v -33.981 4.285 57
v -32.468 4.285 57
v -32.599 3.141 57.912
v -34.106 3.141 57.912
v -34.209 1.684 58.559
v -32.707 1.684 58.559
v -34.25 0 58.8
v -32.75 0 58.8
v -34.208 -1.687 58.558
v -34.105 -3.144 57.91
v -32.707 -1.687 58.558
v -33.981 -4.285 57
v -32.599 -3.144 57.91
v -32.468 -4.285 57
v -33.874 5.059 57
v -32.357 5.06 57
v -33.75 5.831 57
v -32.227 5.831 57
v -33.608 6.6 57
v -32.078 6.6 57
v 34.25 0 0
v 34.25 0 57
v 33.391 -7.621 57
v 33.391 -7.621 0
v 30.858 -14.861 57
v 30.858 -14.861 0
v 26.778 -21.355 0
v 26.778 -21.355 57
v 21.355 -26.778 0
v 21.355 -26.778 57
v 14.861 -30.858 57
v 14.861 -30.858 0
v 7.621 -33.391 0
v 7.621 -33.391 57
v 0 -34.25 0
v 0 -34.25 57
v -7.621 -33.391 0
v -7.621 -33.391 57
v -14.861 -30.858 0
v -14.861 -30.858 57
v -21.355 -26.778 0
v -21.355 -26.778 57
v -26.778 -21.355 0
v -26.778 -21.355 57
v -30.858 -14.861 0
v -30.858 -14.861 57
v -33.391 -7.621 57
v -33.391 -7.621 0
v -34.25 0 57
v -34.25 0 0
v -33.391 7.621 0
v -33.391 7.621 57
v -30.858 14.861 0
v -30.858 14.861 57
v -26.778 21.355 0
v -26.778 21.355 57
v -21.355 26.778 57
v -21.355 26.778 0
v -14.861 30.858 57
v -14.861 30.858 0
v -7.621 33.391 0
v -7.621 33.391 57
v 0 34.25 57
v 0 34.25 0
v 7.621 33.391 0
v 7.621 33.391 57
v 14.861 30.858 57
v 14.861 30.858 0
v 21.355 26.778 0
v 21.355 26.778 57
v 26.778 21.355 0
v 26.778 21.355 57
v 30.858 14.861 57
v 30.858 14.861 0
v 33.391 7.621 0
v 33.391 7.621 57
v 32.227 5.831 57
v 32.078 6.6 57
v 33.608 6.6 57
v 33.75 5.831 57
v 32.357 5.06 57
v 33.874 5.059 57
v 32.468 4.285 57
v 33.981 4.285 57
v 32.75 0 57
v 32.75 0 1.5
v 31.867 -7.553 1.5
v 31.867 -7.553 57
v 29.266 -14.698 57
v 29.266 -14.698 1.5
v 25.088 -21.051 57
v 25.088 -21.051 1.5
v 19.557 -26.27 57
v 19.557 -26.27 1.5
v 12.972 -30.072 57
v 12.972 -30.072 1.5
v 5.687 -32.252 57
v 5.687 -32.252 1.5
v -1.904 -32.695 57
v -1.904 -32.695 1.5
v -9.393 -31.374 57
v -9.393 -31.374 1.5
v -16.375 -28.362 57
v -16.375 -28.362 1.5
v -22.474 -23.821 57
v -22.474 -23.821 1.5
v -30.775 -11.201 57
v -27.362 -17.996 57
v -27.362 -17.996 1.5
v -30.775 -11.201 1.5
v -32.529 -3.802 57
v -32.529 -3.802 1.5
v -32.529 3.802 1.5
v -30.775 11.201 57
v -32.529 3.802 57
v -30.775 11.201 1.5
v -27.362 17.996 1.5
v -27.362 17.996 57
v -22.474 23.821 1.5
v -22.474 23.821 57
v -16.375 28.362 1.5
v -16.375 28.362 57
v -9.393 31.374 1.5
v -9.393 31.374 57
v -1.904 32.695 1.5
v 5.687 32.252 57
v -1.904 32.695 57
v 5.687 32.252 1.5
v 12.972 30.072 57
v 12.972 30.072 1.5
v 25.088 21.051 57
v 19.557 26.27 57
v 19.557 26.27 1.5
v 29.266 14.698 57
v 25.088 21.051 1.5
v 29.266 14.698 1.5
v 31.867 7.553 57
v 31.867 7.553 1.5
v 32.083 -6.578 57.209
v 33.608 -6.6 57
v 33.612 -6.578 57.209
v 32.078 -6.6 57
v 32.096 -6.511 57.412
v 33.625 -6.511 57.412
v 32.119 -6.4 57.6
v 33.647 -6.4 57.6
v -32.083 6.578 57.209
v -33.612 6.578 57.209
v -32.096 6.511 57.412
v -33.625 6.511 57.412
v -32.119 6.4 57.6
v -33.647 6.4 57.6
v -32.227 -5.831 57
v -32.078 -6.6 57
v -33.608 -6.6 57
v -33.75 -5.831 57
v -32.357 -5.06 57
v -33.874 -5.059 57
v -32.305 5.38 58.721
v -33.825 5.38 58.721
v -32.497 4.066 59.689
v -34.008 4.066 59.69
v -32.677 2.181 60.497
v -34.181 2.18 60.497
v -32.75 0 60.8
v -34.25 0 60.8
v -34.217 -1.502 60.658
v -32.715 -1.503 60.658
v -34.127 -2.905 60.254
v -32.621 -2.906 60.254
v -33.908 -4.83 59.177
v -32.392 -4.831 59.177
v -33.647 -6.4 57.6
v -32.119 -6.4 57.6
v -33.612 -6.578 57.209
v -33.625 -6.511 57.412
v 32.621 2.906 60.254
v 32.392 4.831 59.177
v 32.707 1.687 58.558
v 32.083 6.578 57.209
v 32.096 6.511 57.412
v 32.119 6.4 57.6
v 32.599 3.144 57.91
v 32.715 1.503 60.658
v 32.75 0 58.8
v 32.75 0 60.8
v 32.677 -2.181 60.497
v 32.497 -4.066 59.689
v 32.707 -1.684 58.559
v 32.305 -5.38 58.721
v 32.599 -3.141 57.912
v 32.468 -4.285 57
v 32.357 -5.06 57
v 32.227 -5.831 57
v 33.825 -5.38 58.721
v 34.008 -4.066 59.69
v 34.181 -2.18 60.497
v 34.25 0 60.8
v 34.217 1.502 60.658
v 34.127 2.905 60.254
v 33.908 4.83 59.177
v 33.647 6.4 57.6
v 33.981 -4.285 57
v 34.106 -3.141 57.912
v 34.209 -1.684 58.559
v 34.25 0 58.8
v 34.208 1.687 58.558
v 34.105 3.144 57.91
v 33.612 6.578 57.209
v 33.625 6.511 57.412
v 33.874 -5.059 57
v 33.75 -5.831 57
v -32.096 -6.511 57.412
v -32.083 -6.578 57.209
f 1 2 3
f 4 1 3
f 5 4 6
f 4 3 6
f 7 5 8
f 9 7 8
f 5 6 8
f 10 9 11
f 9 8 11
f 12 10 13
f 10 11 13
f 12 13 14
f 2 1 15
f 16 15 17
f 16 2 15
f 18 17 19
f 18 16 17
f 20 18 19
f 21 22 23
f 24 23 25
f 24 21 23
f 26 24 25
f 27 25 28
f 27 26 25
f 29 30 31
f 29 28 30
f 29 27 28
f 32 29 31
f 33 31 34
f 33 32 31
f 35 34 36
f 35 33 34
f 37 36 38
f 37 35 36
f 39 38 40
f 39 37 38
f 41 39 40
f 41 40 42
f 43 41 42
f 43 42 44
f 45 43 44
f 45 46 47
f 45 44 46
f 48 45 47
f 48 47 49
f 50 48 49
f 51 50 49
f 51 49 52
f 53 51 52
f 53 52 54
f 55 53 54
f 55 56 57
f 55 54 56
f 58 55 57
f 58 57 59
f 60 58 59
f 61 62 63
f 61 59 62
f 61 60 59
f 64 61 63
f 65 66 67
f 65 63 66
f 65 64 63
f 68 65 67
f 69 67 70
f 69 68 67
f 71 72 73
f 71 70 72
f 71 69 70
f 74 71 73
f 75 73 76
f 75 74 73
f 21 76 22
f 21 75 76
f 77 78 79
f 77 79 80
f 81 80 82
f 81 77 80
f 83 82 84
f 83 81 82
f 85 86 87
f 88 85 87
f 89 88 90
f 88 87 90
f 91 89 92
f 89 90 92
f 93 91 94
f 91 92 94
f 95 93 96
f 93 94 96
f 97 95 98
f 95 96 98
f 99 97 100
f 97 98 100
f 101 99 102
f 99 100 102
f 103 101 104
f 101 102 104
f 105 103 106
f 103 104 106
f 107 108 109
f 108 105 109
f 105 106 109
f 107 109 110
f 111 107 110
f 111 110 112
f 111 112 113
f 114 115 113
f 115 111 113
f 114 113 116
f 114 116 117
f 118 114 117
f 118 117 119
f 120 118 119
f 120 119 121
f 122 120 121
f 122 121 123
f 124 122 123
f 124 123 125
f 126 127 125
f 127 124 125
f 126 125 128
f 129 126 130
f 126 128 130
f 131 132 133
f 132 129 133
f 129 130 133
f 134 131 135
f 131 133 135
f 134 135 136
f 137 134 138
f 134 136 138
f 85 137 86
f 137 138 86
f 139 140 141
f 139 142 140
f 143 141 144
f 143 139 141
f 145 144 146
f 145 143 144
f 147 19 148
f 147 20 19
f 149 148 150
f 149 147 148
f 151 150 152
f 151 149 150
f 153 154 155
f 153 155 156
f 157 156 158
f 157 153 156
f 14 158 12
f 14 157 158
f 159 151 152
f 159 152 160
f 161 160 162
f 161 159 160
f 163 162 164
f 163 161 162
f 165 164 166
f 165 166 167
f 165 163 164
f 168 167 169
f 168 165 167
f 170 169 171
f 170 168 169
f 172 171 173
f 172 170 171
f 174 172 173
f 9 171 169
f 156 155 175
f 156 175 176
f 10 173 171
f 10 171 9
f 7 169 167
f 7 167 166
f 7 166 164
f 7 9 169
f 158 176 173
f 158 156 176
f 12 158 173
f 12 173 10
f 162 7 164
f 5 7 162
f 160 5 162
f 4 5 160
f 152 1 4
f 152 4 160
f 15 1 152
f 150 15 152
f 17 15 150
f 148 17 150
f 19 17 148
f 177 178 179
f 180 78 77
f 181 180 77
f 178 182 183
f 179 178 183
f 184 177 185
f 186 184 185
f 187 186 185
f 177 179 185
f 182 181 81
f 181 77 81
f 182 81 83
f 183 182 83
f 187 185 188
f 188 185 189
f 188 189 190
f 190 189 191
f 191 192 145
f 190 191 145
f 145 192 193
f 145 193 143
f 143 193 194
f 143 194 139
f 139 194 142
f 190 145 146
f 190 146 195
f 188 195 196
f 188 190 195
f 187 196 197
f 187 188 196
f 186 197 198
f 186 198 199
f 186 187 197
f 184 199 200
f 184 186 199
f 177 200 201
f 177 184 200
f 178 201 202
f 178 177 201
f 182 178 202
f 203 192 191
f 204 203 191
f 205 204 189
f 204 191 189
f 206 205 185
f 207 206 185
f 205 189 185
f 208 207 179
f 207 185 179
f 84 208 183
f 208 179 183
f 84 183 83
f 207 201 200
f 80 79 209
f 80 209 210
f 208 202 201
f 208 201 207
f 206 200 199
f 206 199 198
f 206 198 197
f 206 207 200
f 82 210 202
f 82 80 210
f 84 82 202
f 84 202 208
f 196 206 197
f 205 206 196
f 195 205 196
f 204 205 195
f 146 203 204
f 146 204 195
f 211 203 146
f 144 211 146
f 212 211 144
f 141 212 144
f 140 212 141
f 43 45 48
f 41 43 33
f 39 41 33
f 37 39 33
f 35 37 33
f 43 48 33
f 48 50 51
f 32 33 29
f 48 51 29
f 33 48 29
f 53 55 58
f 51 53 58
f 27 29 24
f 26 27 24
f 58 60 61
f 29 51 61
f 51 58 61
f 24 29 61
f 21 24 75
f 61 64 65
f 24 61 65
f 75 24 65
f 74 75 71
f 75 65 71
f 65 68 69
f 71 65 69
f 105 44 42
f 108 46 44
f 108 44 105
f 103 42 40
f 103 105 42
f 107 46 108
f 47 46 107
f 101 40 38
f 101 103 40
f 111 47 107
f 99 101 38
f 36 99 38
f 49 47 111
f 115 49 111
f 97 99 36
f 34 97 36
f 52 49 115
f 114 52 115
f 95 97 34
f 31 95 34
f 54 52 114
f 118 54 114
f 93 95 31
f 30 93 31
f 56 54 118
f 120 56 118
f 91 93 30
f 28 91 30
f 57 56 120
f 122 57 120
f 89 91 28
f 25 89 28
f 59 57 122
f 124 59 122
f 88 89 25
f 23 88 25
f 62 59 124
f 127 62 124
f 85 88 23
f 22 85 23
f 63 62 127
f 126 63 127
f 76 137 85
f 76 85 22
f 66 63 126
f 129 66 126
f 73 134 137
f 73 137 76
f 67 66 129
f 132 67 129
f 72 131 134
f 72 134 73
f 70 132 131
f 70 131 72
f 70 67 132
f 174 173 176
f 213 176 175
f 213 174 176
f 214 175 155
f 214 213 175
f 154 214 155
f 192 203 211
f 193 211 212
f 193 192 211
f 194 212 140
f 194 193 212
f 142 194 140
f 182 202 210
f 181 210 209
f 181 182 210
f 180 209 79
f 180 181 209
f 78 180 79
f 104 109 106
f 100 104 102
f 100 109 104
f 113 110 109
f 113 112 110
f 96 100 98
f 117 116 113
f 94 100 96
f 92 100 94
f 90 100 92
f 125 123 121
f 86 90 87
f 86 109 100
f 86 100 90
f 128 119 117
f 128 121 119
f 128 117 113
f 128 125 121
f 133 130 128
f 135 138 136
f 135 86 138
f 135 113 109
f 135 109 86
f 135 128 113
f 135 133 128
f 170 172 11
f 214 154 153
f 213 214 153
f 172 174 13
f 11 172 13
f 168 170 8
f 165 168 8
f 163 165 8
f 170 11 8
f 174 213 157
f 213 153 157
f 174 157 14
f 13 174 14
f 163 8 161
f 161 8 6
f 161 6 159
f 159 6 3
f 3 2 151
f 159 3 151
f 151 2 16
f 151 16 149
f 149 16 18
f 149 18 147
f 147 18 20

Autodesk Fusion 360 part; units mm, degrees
sketch "草图1" plane through (0, 0, 0) normal (0, 0, 1) x (1, 0, 0)
  circle A0 centre (0, 0) radius 34.25
  circle A1 centre (0, 0) radius 32.75
  dimension "d1" = 68.5
  dimension "d2" = -1.5
extrude "拉伸1" add sketch "草图1" along normal blind 1.5 contours A0 | A1 makes body 1
extrude "拉伸2" cut sketch "草图1" along normal blind 40 bodies 1
extrude "拉伸3" add sketch "草图1" along normal blind 57 bodies 1
ref_plane "工作平面1" through (18, 0, 0) normal (1, 0, 0) x (0, 1, 0)
sketch "草图3" plane through (18, 0, 0) normal (1, 0, 0) x (0, 1, 0)
  arc A0 (6.4, 57.6) -> (-6.4, 57.6) centre (0, 52.8) ccw
  arc A1 (4.8, 56.4) -> (6.4, 57.6) centre (5.6, 57) ccw
  arc A2 (4.8, 56.4) -> (-4.8, 56.4) centre (0, 52.8) ccw
  arc A3 (-6.4, 57.6) -> (-4.8, 56.4) centre (-5.6, 57) ccw
  arc A4 (5.6, 57) -> (-5.6, 57) centre (0, 52.8) ccw construction
  line L0 (34.25, 57) -> (-34.25, 57)
  line L1 (34.25, 0) -> (-34.25, 0)
  line L2 (0, 0) -> (0, 67.7066) construction
  dimension "d22" = 7
  dimension "d23" = 8
  dimension "d24" = 6
  dimension "d25" = 11.2
extrude "拉伸5" add sketch "草图3" along normal blind 18 separate body contours A0 A1 A2 A3 L0 makes body 2
extrude "拉伸7" cut 1 faces at (33.6225, -1.7016, 57) along direction (0, 0, 1) blind 10 keep common part on bodies 1 bodies 2
pattern_circular "C-阵列2" count 2 over 360 about axis through (0, 0, 1.75) along (0, 0, 1) of bodies 2 makes body 3
